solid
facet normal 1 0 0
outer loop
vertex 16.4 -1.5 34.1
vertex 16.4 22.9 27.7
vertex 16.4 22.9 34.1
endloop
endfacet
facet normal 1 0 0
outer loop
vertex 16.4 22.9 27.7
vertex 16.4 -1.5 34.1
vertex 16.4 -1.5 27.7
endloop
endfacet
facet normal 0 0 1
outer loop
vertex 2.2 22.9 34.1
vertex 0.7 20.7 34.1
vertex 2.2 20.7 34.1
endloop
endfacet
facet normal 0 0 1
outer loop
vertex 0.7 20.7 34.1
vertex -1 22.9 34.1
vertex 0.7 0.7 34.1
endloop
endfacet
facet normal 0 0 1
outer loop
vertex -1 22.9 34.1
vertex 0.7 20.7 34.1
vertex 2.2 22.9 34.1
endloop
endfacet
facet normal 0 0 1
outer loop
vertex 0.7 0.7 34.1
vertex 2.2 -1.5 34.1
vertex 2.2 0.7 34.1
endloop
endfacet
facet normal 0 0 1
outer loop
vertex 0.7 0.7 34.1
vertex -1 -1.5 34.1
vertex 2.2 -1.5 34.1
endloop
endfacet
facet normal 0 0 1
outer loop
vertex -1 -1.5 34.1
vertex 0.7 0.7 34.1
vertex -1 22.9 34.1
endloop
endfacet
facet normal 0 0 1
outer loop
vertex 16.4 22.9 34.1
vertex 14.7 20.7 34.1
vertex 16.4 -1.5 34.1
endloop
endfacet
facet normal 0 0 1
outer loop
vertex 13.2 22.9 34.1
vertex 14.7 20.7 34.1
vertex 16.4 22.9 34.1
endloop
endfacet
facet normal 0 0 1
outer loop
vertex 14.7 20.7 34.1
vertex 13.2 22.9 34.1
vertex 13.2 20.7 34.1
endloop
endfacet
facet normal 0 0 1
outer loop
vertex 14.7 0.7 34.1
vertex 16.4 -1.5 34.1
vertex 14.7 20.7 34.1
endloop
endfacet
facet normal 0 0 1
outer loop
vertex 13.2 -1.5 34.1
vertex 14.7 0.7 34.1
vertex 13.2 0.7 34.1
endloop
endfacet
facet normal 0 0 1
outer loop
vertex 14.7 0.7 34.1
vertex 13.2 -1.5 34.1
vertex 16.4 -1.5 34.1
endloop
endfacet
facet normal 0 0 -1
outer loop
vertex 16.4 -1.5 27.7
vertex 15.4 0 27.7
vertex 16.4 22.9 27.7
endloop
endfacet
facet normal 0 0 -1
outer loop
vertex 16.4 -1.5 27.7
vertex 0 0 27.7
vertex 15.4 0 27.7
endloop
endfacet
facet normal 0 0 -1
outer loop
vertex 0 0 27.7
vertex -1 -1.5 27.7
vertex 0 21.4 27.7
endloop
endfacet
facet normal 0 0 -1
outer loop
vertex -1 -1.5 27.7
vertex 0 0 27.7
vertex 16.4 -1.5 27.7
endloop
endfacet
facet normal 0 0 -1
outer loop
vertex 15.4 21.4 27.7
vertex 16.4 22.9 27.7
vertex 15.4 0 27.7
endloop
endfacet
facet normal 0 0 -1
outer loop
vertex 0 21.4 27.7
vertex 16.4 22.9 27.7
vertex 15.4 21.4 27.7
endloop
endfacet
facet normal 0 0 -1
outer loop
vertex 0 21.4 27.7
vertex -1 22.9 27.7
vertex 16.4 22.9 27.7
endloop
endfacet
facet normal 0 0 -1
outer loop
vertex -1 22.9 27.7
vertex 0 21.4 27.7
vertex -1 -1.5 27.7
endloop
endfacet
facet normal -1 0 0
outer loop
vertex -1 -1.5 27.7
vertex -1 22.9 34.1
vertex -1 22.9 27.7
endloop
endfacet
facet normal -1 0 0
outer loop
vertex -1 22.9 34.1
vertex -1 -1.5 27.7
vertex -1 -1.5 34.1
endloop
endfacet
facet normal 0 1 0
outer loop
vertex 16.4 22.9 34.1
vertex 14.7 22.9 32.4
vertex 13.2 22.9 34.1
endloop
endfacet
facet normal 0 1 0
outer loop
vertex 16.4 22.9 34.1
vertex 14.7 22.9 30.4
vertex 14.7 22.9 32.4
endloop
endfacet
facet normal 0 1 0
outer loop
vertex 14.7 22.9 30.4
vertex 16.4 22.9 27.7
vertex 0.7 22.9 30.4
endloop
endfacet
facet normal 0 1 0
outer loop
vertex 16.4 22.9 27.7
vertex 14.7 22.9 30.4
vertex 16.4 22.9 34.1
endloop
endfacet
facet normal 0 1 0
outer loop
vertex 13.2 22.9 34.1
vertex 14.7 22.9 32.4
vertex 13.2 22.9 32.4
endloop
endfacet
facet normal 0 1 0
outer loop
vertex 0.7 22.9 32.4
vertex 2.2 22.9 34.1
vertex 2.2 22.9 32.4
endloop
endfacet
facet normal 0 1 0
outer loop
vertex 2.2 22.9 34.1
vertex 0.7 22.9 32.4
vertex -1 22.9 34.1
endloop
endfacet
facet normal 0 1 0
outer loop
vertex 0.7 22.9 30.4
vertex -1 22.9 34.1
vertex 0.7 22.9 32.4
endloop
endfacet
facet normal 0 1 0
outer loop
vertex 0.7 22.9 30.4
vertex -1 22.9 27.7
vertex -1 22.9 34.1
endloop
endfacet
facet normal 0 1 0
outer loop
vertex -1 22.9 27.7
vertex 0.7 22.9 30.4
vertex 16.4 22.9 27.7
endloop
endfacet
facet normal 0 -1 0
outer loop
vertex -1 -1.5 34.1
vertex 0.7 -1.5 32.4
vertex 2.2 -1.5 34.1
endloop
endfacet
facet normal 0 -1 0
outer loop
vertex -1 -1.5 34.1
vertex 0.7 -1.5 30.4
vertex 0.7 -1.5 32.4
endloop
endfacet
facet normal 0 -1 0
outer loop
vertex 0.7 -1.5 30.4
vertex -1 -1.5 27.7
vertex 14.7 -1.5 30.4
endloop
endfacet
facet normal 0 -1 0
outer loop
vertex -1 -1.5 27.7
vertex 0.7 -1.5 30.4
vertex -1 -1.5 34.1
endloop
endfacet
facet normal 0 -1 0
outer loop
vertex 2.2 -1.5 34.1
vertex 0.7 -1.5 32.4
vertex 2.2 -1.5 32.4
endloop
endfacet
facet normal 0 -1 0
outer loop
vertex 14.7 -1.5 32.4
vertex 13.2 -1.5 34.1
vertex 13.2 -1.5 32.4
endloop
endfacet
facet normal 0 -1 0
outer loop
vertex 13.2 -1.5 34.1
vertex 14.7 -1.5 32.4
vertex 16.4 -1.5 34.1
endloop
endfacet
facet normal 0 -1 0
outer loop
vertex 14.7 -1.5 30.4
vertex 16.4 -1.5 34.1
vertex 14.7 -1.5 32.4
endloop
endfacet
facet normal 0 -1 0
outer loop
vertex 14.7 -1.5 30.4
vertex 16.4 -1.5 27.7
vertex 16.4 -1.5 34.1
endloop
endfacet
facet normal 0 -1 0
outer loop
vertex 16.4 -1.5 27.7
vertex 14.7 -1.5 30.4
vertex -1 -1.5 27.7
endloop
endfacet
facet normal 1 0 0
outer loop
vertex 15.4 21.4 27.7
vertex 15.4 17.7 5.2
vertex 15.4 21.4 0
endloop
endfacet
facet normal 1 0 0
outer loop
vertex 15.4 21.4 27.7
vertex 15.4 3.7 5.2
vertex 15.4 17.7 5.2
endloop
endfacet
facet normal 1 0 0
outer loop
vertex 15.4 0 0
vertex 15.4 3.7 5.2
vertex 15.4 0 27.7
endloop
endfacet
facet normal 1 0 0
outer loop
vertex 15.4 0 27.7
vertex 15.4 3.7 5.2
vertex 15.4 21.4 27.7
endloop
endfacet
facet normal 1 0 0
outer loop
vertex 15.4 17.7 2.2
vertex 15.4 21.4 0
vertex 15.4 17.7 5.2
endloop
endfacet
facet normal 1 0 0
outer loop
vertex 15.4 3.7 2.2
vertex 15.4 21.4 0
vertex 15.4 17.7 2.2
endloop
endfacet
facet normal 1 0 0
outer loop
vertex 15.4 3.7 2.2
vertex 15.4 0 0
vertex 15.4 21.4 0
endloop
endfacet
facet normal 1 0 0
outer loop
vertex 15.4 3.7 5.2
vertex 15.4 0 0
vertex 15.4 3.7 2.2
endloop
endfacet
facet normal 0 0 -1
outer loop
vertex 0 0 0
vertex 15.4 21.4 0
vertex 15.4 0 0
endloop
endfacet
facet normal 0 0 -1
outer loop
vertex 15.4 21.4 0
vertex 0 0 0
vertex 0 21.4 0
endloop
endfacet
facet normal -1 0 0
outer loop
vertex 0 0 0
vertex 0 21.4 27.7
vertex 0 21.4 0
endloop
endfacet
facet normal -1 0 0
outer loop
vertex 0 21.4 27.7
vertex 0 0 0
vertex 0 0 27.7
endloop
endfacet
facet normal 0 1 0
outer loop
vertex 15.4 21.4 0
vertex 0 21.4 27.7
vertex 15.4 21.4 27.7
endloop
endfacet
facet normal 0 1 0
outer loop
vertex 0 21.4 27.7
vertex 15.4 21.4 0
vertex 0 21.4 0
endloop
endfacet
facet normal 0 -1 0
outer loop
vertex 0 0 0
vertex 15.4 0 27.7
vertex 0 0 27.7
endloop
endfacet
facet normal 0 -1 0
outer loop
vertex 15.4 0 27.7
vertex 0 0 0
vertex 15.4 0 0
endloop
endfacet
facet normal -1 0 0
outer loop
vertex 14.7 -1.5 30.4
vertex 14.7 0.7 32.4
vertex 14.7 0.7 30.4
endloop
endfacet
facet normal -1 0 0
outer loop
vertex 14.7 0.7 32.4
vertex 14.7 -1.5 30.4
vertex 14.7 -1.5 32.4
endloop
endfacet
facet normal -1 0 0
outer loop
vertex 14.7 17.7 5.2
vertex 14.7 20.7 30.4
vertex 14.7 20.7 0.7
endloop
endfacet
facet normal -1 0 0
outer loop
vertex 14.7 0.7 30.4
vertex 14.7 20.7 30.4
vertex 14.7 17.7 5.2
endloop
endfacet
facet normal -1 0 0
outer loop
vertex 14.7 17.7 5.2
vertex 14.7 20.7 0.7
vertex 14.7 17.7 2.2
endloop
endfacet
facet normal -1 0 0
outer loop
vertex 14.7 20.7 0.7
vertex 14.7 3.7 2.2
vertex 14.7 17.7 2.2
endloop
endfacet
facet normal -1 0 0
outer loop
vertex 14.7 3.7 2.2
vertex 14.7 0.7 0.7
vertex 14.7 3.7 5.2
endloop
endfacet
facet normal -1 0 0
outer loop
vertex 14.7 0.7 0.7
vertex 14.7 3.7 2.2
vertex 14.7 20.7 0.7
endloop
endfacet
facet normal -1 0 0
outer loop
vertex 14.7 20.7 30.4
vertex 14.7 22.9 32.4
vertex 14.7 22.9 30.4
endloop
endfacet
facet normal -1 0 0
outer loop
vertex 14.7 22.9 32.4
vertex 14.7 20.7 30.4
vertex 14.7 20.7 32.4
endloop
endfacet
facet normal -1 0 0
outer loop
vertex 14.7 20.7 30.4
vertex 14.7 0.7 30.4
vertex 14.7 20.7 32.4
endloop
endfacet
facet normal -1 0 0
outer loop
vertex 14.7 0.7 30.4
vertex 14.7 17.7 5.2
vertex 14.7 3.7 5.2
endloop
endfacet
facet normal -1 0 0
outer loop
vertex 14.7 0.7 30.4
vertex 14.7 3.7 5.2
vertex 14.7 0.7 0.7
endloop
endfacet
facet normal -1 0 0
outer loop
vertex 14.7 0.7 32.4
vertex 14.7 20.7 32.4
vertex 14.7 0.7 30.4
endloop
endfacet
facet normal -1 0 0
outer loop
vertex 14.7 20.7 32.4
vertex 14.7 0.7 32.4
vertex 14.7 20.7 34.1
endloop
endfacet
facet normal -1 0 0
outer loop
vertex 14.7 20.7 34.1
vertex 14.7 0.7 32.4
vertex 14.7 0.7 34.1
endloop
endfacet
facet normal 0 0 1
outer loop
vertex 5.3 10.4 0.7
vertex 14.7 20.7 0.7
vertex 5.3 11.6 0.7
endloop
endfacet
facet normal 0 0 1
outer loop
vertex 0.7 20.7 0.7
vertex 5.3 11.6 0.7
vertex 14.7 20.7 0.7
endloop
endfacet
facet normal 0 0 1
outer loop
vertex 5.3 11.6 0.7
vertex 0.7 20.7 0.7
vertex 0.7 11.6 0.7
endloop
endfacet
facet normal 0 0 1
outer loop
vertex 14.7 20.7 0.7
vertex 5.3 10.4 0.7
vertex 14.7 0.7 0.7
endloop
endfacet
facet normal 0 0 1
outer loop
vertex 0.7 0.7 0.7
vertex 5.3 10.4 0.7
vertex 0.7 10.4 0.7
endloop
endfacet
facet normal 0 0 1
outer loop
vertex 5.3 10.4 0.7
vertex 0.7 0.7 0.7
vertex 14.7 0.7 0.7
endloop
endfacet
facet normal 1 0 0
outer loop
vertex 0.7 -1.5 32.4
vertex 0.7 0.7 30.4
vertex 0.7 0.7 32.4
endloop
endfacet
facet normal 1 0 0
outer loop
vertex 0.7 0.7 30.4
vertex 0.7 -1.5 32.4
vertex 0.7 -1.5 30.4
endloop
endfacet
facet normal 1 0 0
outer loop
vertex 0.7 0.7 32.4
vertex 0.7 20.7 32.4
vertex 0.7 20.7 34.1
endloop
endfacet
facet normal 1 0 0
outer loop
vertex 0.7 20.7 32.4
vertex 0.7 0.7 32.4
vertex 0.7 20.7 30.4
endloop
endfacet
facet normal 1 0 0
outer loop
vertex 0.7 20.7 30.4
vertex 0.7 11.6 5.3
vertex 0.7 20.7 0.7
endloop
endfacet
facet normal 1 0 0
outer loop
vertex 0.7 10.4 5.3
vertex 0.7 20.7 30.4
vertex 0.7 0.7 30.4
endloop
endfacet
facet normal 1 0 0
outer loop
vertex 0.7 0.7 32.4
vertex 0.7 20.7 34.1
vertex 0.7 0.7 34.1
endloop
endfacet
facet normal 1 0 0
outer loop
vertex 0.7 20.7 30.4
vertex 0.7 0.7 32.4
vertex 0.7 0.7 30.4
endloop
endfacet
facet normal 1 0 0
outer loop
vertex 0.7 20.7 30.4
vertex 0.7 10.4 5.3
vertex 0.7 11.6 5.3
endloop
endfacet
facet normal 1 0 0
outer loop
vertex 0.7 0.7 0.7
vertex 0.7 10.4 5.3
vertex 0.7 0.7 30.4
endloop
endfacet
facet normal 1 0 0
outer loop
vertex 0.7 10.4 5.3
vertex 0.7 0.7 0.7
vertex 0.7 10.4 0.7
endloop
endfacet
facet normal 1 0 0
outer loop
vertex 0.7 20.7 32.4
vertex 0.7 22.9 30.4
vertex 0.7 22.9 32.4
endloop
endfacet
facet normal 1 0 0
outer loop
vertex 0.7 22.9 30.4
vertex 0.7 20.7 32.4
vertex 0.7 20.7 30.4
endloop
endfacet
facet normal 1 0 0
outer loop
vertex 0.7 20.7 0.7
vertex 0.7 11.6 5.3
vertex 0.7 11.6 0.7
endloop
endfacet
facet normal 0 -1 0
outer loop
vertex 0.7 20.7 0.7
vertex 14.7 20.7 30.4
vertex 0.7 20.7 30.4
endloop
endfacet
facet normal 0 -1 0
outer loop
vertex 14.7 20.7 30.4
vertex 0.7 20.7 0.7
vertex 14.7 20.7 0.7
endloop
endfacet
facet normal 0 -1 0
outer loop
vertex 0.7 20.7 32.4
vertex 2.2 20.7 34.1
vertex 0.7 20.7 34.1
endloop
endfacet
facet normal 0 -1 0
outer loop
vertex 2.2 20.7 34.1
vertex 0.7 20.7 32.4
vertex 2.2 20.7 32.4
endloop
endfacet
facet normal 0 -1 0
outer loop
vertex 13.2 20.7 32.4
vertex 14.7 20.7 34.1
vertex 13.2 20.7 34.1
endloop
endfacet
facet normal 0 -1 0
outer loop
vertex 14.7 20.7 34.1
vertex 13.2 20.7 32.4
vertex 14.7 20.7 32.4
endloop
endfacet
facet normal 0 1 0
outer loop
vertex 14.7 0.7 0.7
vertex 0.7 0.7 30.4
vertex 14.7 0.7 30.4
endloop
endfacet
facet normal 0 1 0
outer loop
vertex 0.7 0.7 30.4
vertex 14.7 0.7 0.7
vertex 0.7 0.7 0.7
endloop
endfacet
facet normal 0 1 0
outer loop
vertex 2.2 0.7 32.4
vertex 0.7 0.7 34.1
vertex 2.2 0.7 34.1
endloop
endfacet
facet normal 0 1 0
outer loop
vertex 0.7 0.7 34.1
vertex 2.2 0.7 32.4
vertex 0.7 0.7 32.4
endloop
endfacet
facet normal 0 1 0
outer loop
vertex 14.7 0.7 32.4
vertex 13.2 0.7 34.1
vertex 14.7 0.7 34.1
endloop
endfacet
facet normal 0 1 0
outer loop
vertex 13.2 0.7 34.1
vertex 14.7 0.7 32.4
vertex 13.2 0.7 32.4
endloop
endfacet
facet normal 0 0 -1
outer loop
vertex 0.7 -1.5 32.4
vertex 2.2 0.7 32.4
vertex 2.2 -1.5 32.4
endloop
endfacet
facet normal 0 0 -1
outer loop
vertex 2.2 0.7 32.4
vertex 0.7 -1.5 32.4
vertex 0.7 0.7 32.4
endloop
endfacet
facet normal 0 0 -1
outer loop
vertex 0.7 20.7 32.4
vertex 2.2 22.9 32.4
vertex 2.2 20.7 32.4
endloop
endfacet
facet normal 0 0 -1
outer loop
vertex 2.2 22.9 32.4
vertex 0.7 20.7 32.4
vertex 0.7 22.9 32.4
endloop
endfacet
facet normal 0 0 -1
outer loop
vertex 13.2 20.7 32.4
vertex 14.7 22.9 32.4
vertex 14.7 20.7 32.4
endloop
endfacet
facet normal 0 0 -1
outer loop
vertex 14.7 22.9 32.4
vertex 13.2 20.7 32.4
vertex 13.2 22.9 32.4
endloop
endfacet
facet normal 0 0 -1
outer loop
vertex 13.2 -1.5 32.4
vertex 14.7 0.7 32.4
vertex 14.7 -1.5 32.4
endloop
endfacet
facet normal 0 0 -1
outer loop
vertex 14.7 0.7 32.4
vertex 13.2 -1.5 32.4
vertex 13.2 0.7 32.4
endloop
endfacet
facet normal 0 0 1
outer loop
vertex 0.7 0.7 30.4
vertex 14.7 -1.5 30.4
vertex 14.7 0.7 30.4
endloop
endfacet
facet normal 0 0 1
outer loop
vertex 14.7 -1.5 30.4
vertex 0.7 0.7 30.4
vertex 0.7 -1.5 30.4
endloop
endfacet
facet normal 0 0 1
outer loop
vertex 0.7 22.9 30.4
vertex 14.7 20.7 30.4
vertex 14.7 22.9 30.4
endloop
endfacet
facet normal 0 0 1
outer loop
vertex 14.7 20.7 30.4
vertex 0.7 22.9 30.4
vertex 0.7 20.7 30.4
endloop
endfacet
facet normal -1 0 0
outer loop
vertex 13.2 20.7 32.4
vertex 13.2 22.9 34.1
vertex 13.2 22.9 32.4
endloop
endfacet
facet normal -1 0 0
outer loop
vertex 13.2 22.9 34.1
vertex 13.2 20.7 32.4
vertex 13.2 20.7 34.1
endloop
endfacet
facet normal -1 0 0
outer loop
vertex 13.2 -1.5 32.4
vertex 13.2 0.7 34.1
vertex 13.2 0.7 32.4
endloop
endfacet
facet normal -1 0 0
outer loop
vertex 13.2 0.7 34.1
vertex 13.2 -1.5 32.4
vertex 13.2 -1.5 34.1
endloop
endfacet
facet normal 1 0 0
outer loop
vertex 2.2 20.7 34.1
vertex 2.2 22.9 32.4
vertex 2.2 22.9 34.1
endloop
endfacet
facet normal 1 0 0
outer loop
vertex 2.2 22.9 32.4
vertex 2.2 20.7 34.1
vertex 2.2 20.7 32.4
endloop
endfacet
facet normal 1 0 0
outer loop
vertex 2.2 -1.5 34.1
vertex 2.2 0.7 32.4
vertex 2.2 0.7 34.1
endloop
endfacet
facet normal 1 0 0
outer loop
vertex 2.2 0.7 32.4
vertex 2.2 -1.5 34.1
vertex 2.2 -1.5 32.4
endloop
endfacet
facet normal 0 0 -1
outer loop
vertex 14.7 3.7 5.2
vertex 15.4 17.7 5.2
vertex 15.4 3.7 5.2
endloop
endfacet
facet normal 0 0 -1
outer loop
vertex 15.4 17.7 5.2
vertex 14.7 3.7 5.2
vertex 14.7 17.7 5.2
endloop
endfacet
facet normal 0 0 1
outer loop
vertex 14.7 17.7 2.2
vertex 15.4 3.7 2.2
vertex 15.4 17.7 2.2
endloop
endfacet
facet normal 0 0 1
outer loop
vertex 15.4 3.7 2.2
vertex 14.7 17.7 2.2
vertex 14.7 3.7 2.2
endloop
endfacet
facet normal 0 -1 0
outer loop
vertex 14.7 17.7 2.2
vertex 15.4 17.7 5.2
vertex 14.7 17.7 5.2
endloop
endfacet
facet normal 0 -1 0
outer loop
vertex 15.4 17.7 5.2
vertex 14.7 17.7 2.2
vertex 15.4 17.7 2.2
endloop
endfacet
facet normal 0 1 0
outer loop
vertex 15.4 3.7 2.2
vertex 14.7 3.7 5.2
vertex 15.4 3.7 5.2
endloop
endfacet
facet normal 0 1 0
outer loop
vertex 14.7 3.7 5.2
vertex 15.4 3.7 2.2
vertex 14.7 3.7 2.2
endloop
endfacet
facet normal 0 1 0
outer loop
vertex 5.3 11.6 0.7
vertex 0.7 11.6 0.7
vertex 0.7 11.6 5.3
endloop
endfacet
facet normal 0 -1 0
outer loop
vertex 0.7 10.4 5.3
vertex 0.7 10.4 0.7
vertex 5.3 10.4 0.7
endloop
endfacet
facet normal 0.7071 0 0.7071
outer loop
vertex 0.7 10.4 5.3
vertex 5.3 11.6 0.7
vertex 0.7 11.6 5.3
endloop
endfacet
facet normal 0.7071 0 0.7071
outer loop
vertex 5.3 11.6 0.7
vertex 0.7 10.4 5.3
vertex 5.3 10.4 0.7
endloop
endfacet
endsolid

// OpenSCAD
 

$fn=5;


l = 14;
b = 20;
h = 27;
ho = 3;
bo = 14;
ao = 1.5;

d = 0.7;



btl = 31;
ltl = 14;
htl = 2;
hptl = 2;

bt = 23;
lt = ltl+2;
ht = 2*d+htl+3;


btfl = 31;
ltfl = 11;


translate([0,b/2+1.6,0]) rotate([90,0,0]) scale(6)linear_extrude(0.2)polygon([[0,0],[0,1],[1,0]],[[0,1,2]]);

difference(){
	union(){
		translate([-(lt-l)/2,-(bt-b)/2,h+d]) cube([lt+2*d,bt+2*d, ht]);
		cube([l+2*d,b+2*d,h+d]);

	}
	translate([d,d,d]) cube([l,b,h+ht+1]);
	translate([-(ltl-l-2*d)/2,-(btl-b-2*d)/2,h+hptl+2*d]) cube([ltl,btl,htl]);
	translate([-(ltfl-l-2*d)/2,-(btl-b-2*d)/2,h+hptl+2*d]) cube([ltfl,btfl,ht-hptl+1]);

	translate([d+l/2,d+(b-bo)/2,d+ao]) cube([l,bo,ho]);


}
